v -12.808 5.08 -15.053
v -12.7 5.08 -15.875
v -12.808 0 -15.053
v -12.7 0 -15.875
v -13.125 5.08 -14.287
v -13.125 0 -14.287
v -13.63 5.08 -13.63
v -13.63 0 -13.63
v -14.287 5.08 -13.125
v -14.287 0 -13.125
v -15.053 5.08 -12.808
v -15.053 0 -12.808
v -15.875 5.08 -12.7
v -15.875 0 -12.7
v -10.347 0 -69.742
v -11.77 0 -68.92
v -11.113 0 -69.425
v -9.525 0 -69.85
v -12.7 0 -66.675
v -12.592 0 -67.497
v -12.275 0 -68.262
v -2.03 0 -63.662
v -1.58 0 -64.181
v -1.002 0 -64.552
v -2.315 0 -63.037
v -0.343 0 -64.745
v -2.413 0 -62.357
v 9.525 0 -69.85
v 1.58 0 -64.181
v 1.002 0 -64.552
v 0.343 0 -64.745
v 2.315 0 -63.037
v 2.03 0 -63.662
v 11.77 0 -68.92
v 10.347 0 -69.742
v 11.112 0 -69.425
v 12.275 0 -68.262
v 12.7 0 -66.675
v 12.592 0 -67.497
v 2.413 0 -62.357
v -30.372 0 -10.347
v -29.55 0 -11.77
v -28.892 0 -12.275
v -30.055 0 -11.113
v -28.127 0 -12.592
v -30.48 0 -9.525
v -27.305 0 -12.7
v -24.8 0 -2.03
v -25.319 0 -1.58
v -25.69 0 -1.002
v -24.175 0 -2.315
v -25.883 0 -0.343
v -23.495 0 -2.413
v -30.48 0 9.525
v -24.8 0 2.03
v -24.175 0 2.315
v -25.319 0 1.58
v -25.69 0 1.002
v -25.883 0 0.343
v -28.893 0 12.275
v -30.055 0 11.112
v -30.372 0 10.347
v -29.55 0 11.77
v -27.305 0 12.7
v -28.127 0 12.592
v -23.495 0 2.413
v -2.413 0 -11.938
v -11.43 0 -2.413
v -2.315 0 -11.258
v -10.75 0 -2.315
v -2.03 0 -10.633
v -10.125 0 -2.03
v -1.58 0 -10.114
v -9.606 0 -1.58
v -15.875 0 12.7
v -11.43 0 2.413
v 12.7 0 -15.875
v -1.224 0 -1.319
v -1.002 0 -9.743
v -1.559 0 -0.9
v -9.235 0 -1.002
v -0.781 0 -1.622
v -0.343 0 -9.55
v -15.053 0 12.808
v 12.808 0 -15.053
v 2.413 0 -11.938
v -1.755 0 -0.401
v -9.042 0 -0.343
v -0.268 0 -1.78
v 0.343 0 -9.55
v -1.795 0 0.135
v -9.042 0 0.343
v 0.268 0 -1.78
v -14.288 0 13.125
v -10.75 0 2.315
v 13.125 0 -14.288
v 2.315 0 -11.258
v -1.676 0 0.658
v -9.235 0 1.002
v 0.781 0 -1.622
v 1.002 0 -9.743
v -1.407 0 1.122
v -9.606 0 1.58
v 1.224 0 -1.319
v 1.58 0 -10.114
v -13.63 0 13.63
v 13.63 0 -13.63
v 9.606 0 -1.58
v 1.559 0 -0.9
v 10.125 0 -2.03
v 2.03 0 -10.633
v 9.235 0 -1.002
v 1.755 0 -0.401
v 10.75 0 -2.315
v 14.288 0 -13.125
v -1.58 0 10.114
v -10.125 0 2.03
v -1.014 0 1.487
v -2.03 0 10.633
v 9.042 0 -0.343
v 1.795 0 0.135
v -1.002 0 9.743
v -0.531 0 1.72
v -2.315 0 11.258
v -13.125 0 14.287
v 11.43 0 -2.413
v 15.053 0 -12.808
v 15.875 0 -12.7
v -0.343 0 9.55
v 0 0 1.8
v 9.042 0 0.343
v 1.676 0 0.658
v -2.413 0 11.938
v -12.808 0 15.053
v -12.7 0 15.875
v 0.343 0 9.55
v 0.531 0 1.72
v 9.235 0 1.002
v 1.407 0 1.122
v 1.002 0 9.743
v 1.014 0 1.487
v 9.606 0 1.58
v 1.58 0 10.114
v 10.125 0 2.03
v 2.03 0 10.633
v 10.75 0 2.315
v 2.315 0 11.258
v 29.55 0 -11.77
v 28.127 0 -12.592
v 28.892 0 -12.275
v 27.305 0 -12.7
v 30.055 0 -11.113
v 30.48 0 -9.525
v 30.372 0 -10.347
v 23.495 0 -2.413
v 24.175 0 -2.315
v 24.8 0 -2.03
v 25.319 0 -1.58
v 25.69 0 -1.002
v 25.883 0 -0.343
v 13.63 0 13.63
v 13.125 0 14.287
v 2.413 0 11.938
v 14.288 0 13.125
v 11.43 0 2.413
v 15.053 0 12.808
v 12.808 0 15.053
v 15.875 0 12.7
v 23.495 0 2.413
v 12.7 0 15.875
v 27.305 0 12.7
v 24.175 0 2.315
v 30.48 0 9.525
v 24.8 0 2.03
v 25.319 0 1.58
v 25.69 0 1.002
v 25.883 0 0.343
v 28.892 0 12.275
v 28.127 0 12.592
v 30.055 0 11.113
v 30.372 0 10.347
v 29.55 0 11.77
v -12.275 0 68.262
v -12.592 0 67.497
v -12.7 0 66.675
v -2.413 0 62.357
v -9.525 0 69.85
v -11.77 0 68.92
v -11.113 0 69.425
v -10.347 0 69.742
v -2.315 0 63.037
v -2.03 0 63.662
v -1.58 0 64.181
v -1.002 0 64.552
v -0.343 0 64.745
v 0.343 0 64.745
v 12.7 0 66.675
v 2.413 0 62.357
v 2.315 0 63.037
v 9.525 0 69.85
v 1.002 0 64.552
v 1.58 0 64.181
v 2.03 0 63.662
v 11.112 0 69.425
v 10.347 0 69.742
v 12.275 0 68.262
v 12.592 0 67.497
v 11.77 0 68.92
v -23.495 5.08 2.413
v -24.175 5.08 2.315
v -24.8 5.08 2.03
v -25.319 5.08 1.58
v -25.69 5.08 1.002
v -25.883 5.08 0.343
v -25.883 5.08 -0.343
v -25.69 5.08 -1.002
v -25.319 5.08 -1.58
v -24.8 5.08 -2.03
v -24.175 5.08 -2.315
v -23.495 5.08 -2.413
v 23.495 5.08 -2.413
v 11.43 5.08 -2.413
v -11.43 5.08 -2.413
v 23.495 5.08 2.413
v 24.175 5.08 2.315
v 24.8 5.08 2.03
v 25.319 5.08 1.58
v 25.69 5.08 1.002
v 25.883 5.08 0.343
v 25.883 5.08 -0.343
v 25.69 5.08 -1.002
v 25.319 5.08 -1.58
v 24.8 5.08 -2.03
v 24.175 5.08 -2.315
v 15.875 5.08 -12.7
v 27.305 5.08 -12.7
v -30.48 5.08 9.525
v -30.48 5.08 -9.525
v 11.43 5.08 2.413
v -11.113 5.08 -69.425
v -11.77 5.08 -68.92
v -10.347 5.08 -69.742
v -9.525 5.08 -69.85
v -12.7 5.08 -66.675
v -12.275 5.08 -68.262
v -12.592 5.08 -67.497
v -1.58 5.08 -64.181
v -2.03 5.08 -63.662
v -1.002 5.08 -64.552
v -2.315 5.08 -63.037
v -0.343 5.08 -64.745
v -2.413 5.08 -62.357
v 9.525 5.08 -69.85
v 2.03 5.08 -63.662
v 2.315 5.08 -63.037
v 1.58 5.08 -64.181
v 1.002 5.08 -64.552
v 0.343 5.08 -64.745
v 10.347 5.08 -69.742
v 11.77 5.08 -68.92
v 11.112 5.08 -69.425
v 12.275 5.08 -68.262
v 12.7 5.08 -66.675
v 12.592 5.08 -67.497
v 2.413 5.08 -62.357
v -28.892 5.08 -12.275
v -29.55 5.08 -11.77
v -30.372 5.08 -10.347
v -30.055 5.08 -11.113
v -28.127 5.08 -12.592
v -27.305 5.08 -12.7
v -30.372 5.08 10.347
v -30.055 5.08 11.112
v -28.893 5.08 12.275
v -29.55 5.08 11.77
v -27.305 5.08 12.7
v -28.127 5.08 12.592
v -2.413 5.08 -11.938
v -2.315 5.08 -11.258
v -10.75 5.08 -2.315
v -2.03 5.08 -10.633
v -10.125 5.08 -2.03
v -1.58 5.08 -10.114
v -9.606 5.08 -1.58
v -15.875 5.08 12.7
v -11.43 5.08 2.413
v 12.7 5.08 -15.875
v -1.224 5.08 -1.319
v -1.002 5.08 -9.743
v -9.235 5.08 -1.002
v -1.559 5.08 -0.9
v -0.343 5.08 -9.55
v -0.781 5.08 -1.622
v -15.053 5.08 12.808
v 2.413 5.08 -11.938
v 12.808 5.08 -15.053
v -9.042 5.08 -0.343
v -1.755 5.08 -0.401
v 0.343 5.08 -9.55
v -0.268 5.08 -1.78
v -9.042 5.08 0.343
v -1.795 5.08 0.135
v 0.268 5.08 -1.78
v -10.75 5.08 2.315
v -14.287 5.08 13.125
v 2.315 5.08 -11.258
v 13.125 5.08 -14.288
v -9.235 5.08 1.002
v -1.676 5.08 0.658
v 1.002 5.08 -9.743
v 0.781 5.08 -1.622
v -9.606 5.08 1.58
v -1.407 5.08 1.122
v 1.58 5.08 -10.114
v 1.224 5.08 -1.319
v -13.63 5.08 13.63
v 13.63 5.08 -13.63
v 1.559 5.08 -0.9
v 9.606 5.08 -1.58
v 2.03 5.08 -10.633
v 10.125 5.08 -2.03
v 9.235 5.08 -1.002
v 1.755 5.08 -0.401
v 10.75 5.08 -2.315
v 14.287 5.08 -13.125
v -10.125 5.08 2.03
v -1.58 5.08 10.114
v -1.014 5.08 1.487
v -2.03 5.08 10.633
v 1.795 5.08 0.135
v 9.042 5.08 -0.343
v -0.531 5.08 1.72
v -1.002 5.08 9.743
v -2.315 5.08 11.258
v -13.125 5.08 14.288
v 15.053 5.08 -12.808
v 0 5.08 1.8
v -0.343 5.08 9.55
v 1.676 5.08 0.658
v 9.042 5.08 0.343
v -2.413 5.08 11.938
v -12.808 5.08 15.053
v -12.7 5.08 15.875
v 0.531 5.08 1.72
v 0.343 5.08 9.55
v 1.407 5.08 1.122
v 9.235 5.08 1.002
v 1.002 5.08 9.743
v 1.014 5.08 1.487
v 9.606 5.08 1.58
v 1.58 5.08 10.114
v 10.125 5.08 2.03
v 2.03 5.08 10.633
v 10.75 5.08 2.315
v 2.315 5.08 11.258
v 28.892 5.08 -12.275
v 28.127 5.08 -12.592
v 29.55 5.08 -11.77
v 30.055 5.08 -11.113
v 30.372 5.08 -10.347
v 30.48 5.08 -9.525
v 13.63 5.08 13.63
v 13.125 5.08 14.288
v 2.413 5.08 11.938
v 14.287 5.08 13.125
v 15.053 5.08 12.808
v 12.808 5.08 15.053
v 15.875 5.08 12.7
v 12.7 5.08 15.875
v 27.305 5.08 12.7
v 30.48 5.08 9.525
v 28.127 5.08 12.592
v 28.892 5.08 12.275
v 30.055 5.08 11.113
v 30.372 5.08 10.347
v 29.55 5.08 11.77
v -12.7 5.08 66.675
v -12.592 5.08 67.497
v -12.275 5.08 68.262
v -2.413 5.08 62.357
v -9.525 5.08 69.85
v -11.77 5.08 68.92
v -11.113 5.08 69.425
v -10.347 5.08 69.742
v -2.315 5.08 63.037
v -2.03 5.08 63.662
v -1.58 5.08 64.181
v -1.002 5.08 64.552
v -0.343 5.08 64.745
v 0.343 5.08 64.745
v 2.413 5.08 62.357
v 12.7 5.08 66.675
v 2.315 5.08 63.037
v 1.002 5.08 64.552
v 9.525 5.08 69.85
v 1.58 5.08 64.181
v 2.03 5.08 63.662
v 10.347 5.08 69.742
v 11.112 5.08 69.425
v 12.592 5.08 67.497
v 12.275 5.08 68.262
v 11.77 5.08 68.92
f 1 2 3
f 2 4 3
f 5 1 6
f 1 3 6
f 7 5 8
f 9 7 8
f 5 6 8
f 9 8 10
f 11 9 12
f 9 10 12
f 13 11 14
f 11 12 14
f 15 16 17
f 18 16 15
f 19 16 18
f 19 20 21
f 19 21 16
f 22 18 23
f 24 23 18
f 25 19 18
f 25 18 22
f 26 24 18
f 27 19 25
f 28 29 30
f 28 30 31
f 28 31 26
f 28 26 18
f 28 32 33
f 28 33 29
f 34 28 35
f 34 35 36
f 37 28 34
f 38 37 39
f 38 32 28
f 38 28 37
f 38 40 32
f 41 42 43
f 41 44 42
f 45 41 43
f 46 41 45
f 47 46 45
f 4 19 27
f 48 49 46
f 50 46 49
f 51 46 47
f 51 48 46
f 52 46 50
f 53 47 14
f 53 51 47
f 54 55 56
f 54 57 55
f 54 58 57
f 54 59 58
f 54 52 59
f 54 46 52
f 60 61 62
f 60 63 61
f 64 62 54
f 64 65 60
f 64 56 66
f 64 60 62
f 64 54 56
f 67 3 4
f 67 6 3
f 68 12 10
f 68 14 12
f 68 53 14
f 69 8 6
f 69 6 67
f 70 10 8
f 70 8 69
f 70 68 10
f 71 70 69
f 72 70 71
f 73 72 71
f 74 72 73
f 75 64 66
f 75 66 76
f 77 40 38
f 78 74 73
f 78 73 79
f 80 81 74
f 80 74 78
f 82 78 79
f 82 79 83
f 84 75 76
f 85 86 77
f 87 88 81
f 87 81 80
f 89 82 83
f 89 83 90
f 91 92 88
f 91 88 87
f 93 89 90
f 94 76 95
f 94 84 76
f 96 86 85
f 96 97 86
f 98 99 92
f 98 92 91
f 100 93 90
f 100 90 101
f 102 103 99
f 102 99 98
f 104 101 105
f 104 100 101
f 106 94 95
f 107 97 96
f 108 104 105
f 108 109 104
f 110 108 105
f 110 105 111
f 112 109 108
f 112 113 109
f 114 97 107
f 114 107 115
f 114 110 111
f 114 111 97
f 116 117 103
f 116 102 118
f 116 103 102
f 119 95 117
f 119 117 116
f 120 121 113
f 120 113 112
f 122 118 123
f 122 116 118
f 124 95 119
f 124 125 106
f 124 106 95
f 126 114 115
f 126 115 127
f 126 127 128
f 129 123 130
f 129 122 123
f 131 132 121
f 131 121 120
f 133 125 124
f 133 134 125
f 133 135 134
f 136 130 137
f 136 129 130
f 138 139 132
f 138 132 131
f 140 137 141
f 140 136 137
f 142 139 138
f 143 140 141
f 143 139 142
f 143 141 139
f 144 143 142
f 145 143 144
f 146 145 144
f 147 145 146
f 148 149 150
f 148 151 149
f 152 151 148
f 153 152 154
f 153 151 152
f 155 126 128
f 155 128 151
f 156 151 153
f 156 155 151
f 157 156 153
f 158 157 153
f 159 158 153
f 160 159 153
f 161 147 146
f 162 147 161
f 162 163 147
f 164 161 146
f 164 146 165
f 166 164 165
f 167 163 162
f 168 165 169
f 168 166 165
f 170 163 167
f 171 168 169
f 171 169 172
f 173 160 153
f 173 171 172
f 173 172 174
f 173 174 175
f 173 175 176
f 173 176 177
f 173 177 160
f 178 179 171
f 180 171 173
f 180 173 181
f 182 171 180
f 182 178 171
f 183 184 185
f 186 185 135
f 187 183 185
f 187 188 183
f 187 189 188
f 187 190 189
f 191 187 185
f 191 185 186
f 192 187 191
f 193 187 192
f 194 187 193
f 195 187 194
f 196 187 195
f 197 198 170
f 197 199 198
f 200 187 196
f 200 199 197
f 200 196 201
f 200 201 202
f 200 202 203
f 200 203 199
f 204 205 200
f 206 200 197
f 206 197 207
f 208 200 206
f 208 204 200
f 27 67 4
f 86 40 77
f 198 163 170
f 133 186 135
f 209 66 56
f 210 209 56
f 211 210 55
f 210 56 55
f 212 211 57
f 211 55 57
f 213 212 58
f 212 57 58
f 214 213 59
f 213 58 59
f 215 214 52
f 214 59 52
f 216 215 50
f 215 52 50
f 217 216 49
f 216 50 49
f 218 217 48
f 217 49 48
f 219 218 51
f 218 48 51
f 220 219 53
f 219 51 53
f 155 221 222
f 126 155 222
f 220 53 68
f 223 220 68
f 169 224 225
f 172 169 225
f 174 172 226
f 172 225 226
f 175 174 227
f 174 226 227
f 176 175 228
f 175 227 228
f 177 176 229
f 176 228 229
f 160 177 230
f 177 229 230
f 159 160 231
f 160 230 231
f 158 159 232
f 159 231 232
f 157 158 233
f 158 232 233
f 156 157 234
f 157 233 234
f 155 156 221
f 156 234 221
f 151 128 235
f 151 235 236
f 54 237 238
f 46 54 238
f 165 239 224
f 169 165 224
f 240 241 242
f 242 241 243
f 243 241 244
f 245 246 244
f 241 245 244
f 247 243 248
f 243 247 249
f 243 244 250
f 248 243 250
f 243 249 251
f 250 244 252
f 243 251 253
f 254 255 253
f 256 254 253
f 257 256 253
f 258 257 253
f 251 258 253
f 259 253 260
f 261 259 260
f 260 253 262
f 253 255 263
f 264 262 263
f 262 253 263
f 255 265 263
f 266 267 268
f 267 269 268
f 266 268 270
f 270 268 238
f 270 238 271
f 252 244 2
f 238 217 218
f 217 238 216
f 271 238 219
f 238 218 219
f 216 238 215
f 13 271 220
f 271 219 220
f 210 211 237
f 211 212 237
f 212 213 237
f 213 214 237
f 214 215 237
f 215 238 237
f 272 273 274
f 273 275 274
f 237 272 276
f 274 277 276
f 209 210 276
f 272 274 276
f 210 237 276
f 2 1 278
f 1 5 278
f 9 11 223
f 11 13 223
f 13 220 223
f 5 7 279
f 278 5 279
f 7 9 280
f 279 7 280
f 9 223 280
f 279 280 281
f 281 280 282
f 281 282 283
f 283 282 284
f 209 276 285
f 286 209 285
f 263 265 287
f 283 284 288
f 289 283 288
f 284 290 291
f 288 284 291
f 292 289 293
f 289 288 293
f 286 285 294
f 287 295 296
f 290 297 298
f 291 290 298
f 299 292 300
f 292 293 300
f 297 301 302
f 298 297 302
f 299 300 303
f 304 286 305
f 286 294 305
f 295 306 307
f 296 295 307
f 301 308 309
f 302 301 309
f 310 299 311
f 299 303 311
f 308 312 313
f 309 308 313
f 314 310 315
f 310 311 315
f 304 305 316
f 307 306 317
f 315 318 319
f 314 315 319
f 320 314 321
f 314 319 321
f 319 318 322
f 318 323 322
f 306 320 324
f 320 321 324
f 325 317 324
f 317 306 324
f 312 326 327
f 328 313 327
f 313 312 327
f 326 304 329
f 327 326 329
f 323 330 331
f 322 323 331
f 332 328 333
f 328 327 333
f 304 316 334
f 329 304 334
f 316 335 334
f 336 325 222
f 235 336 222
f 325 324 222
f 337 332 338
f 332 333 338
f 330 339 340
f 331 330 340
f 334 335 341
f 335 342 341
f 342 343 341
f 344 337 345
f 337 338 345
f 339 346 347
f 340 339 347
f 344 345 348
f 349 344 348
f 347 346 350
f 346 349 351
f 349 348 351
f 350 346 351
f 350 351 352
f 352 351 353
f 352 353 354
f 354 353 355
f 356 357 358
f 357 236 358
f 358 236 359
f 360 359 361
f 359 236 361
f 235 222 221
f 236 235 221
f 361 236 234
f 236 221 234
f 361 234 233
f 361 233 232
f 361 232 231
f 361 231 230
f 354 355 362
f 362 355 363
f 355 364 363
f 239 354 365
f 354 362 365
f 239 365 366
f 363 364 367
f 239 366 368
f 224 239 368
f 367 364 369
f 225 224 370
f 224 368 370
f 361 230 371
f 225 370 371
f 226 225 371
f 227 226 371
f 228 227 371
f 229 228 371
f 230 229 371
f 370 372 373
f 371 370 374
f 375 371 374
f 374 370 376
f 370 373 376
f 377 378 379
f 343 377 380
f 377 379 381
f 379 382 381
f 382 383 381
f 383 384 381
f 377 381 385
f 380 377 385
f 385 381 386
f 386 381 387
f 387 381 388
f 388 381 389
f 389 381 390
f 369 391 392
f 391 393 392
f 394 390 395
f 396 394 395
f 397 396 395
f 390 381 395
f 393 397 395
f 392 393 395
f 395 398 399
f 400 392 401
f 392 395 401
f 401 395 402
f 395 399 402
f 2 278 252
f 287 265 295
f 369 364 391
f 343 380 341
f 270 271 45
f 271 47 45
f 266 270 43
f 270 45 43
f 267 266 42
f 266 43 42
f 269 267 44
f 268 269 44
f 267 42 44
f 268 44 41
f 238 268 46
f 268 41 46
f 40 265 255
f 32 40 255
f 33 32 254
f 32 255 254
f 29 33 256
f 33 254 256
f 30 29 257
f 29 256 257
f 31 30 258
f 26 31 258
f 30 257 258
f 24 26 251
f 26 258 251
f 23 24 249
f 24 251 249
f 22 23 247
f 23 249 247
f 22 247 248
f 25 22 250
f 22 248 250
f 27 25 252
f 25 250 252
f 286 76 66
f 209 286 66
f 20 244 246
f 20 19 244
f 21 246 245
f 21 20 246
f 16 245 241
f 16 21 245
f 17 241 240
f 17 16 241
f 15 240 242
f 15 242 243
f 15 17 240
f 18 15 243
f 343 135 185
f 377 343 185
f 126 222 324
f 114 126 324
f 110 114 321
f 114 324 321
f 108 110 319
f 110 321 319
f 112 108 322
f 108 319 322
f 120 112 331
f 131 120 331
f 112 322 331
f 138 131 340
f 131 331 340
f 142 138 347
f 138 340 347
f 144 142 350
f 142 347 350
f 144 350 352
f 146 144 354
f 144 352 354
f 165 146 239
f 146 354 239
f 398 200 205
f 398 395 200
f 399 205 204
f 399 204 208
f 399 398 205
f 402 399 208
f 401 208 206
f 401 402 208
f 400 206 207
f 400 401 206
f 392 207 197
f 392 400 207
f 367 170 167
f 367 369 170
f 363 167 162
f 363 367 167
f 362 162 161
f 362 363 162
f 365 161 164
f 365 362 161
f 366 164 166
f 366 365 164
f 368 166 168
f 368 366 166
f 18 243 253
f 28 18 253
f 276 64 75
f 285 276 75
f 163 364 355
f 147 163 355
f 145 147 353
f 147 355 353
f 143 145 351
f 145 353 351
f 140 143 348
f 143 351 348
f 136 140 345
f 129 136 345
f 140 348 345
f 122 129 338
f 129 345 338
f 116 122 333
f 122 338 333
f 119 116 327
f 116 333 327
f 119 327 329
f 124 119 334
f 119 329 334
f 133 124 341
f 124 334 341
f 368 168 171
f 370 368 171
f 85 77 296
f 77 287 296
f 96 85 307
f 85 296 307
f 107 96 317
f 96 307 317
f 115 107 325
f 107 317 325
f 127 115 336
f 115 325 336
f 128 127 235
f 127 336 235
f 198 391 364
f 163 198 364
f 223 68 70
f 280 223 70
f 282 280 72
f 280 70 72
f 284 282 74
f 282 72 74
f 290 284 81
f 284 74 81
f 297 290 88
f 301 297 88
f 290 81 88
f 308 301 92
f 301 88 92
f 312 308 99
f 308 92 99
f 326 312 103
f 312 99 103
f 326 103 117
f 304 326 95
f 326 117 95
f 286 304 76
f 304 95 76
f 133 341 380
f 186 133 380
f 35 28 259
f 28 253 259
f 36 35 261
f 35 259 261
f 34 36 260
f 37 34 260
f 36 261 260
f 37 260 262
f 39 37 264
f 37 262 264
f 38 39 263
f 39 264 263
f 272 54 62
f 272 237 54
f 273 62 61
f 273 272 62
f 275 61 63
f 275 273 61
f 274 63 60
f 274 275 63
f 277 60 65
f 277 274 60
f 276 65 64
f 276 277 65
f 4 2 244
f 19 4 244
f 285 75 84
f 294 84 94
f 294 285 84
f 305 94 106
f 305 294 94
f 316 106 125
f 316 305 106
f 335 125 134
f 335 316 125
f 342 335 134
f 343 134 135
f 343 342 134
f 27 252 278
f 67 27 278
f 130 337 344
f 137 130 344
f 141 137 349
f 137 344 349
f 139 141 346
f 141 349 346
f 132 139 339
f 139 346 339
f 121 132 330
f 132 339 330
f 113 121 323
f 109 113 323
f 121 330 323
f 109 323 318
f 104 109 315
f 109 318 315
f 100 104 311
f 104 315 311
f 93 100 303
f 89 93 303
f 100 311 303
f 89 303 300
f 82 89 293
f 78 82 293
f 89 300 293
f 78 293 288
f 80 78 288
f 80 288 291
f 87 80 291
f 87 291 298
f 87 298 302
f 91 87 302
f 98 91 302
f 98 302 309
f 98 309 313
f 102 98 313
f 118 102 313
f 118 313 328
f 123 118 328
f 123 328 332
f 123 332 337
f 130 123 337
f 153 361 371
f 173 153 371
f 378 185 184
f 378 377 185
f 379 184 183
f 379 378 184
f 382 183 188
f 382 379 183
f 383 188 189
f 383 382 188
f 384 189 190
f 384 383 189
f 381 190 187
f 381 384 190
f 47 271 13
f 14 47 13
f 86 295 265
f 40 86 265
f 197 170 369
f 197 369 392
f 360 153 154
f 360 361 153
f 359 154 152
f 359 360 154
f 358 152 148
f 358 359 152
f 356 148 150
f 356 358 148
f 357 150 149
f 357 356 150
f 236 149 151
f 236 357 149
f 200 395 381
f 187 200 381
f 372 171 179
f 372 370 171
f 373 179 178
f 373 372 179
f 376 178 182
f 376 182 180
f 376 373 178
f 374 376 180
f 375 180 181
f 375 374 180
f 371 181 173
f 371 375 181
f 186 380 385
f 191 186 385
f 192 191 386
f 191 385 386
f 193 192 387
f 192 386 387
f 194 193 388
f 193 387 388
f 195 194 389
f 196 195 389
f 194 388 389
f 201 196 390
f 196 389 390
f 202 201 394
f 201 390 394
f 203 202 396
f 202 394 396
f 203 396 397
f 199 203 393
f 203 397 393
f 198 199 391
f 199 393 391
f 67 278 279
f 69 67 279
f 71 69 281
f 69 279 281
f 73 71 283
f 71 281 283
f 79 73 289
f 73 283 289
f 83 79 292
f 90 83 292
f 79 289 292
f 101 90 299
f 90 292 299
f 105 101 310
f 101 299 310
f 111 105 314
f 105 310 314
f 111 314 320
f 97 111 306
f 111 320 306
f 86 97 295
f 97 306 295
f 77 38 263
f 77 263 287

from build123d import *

# Parameters (mm, degrees)
CUT_EXTRUDE1_START = -5.08
CUT_EXTRUDE1_DEPTH = 5.08
SKETCH2_W          = 17.78
SKETCH2_H          = 57.15
CUT_EXTRUDE2_DEPTH = 77.379704765
SKETCH3_W          = 17.78
SKETCH3_H          = 57.15
CUT_EXTRUDE3_DEPTH = 77.379704765
SKETCH4_W          = 17.78
SKETCH4_H          = 57.15
CUT_EXTRUDE4_DEPTH = 77.379704765
CUT_EXTRUDE5_DEPTH = 77.379704765
CUT_EXTRUDE6_DEPTH = 77.379704765
CUT_EXTRUDE7_DEPTH = 77.379704765
CUT_EXTRUDE8_DEPTH = 77.379704765
FILLET1_R          = 3.175
SKETCH11_R         = 1.8
CUT_EXTRUDE9_DEPTH = 77.379704765


with BuildPart() as part:
    # Cut-Extrude1: read off the stored shape, not the designer's step
    # Cut-Extrude1 outline → Cut-Extrude1 (new body)
    with BuildSketch(Plane.XZ.offset(CUT_EXTRUDE1_START)):
        Polygon((-12.7, -12.7), (-12.7, -69.85), (30.48, -69.85), (30.48, 69.85), (-30.48, 69.85), (-30.48, -12.7), align=None)
    extrude(amount=CUT_EXTRUDE1_DEPTH)

    # Sketch2 → Cut-Extrude2 (cut, through all)
    with BuildSketch(Plane.XZ):
        with Locations((-21.59, 41.275)):
            Rectangle(SKETCH2_W, SKETCH2_H)
    extrude(amount=-CUT_EXTRUDE2_DEPTH, mode=Mode.SUBTRACT)

    # Sketch3 → Cut-Extrude3 (cut, through all)
    with BuildSketch(Plane.XZ):
        with Locations((21.59, 41.275)):
            Rectangle(SKETCH3_W, SKETCH3_H)
    extrude(amount=-CUT_EXTRUDE3_DEPTH, mode=Mode.SUBTRACT)

    # Sketch4 → Cut-Extrude4 (cut, through all)
    with BuildSketch(Plane.XZ):
        with Locations((21.59, -41.275)):
            Rectangle(SKETCH4_W, SKETCH4_H)
    extrude(amount=-CUT_EXTRUDE4_DEPTH, mode=Mode.SUBTRACT)

    # Sketch5 → Cut-Extrude5 (cut, through all)
    with BuildSketch(Plane(origin=(0, 5.08, 0), x_dir=(-1, 0, 0), z_dir=(0, 1, 0))):
        with BuildLine():
            Line((2.413, -62.357), (2.413, -11.938))
            ThreePointArc((2.413, -11.938), (0, -9.525), (-2.413, -11.938))
            Line((-2.413, -11.938), (-2.413, -62.357))
            ThreePointArc((-2.413, -62.357), (0, -64.77), (2.413, -62.357))
        make_face()
    extrude(amount=-CUT_EXTRUDE5_DEPTH, mode=Mode.SUBTRACT)

    # Sketch6 → Cut-Extrude6 (cut, through all)
    with BuildSketch(Plane(origin=(0, 5.08, 0), x_dir=(-1, 0, 0), z_dir=(0, 1, 0))):
        with BuildLine():
            Line((-2.413, 62.357), (-2.413, 11.938))
            ThreePointArc((-2.413, 11.938), (0, 9.525), (2.413, 11.938))
            Line((2.413, 11.938), (2.413, 62.357))
            ThreePointArc((2.413, 62.357), (0, 64.77), (-2.413, 62.357))
        make_face()
    extrude(amount=-CUT_EXTRUDE6_DEPTH, mode=Mode.SUBTRACT)

    # Sketch7 → Cut-Extrude7 (cut, through all)
    with BuildSketch(Plane(origin=(0, 5.08, 0), x_dir=(-1, 0, 0), z_dir=(0, 1, 0))):
        with BuildLine():
            Line((-23.495, -2.413), (-11.43, -2.413))
            ThreePointArc((-11.43, -2.413), (-9.017, 0), (-11.43, 2.413))
            Line((-11.43, 2.413), (-23.495, 2.413))
            ThreePointArc((-23.495, 2.413), (-25.908, 0), (-23.495, -2.413))
        make_face()
    extrude(amount=-CUT_EXTRUDE7_DEPTH, mode=Mode.SUBTRACT)

    # Sketch8 → Cut-Extrude8 (cut, through all)
    with BuildSketch(Plane.XZ):
        with BuildLine():
            Line((-23.495, -2.413), (-11.43, -2.413))
            ThreePointArc((-11.43, -2.413), (-9.017, 0), (-11.43, 2.413))
            Line((-11.43, 2.413), (-23.495, 2.413))
            ThreePointArc((-23.495, 2.413), (-25.908, 0), (-23.495, -2.413))
        make_face()
    extrude(amount=-CUT_EXTRUDE8_DEPTH, mode=Mode.SUBTRACT)

    # Fillet1
    fillet1_edges = [part.edges().sort_by_distance(p)[0] for p in [
        (-30.48, 2.54, -12.7),
        (-12.7, 2.54, -12.7),
        (-12.7, 2.54, -69.85),
        (-12.7, 2.54, 69.85),
        (-12.7, 2.54, 12.7),
        (-30.48, 2.54, 12.7),
        (12.7, 2.54, 69.85),
        (30.48, 2.54, 12.7),
        (12.7, 2.54, 12.7),
        (30.48, 2.54, -12.7),
        (12.7, 2.54, -69.85),
        (12.7, 2.54, -12.7),
    ]]
    fillet(fillet1_edges, radius=FILLET1_R)

    # Sketch11 → Cut-Extrude9 (cut, through all)
    with BuildSketch(Plane(origin=(0, 5.08, 0), x_dir=(1, 0, 0), z_dir=(0, 1, 0))):
        with Locations(Location((0, 0, 0), (0, 0, 270))):
            Circle(SKETCH11_R)
    extrude(amount=-CUT_EXTRUDE9_DEPTH, mode=Mode.SUBTRACT)


solid = part.part
